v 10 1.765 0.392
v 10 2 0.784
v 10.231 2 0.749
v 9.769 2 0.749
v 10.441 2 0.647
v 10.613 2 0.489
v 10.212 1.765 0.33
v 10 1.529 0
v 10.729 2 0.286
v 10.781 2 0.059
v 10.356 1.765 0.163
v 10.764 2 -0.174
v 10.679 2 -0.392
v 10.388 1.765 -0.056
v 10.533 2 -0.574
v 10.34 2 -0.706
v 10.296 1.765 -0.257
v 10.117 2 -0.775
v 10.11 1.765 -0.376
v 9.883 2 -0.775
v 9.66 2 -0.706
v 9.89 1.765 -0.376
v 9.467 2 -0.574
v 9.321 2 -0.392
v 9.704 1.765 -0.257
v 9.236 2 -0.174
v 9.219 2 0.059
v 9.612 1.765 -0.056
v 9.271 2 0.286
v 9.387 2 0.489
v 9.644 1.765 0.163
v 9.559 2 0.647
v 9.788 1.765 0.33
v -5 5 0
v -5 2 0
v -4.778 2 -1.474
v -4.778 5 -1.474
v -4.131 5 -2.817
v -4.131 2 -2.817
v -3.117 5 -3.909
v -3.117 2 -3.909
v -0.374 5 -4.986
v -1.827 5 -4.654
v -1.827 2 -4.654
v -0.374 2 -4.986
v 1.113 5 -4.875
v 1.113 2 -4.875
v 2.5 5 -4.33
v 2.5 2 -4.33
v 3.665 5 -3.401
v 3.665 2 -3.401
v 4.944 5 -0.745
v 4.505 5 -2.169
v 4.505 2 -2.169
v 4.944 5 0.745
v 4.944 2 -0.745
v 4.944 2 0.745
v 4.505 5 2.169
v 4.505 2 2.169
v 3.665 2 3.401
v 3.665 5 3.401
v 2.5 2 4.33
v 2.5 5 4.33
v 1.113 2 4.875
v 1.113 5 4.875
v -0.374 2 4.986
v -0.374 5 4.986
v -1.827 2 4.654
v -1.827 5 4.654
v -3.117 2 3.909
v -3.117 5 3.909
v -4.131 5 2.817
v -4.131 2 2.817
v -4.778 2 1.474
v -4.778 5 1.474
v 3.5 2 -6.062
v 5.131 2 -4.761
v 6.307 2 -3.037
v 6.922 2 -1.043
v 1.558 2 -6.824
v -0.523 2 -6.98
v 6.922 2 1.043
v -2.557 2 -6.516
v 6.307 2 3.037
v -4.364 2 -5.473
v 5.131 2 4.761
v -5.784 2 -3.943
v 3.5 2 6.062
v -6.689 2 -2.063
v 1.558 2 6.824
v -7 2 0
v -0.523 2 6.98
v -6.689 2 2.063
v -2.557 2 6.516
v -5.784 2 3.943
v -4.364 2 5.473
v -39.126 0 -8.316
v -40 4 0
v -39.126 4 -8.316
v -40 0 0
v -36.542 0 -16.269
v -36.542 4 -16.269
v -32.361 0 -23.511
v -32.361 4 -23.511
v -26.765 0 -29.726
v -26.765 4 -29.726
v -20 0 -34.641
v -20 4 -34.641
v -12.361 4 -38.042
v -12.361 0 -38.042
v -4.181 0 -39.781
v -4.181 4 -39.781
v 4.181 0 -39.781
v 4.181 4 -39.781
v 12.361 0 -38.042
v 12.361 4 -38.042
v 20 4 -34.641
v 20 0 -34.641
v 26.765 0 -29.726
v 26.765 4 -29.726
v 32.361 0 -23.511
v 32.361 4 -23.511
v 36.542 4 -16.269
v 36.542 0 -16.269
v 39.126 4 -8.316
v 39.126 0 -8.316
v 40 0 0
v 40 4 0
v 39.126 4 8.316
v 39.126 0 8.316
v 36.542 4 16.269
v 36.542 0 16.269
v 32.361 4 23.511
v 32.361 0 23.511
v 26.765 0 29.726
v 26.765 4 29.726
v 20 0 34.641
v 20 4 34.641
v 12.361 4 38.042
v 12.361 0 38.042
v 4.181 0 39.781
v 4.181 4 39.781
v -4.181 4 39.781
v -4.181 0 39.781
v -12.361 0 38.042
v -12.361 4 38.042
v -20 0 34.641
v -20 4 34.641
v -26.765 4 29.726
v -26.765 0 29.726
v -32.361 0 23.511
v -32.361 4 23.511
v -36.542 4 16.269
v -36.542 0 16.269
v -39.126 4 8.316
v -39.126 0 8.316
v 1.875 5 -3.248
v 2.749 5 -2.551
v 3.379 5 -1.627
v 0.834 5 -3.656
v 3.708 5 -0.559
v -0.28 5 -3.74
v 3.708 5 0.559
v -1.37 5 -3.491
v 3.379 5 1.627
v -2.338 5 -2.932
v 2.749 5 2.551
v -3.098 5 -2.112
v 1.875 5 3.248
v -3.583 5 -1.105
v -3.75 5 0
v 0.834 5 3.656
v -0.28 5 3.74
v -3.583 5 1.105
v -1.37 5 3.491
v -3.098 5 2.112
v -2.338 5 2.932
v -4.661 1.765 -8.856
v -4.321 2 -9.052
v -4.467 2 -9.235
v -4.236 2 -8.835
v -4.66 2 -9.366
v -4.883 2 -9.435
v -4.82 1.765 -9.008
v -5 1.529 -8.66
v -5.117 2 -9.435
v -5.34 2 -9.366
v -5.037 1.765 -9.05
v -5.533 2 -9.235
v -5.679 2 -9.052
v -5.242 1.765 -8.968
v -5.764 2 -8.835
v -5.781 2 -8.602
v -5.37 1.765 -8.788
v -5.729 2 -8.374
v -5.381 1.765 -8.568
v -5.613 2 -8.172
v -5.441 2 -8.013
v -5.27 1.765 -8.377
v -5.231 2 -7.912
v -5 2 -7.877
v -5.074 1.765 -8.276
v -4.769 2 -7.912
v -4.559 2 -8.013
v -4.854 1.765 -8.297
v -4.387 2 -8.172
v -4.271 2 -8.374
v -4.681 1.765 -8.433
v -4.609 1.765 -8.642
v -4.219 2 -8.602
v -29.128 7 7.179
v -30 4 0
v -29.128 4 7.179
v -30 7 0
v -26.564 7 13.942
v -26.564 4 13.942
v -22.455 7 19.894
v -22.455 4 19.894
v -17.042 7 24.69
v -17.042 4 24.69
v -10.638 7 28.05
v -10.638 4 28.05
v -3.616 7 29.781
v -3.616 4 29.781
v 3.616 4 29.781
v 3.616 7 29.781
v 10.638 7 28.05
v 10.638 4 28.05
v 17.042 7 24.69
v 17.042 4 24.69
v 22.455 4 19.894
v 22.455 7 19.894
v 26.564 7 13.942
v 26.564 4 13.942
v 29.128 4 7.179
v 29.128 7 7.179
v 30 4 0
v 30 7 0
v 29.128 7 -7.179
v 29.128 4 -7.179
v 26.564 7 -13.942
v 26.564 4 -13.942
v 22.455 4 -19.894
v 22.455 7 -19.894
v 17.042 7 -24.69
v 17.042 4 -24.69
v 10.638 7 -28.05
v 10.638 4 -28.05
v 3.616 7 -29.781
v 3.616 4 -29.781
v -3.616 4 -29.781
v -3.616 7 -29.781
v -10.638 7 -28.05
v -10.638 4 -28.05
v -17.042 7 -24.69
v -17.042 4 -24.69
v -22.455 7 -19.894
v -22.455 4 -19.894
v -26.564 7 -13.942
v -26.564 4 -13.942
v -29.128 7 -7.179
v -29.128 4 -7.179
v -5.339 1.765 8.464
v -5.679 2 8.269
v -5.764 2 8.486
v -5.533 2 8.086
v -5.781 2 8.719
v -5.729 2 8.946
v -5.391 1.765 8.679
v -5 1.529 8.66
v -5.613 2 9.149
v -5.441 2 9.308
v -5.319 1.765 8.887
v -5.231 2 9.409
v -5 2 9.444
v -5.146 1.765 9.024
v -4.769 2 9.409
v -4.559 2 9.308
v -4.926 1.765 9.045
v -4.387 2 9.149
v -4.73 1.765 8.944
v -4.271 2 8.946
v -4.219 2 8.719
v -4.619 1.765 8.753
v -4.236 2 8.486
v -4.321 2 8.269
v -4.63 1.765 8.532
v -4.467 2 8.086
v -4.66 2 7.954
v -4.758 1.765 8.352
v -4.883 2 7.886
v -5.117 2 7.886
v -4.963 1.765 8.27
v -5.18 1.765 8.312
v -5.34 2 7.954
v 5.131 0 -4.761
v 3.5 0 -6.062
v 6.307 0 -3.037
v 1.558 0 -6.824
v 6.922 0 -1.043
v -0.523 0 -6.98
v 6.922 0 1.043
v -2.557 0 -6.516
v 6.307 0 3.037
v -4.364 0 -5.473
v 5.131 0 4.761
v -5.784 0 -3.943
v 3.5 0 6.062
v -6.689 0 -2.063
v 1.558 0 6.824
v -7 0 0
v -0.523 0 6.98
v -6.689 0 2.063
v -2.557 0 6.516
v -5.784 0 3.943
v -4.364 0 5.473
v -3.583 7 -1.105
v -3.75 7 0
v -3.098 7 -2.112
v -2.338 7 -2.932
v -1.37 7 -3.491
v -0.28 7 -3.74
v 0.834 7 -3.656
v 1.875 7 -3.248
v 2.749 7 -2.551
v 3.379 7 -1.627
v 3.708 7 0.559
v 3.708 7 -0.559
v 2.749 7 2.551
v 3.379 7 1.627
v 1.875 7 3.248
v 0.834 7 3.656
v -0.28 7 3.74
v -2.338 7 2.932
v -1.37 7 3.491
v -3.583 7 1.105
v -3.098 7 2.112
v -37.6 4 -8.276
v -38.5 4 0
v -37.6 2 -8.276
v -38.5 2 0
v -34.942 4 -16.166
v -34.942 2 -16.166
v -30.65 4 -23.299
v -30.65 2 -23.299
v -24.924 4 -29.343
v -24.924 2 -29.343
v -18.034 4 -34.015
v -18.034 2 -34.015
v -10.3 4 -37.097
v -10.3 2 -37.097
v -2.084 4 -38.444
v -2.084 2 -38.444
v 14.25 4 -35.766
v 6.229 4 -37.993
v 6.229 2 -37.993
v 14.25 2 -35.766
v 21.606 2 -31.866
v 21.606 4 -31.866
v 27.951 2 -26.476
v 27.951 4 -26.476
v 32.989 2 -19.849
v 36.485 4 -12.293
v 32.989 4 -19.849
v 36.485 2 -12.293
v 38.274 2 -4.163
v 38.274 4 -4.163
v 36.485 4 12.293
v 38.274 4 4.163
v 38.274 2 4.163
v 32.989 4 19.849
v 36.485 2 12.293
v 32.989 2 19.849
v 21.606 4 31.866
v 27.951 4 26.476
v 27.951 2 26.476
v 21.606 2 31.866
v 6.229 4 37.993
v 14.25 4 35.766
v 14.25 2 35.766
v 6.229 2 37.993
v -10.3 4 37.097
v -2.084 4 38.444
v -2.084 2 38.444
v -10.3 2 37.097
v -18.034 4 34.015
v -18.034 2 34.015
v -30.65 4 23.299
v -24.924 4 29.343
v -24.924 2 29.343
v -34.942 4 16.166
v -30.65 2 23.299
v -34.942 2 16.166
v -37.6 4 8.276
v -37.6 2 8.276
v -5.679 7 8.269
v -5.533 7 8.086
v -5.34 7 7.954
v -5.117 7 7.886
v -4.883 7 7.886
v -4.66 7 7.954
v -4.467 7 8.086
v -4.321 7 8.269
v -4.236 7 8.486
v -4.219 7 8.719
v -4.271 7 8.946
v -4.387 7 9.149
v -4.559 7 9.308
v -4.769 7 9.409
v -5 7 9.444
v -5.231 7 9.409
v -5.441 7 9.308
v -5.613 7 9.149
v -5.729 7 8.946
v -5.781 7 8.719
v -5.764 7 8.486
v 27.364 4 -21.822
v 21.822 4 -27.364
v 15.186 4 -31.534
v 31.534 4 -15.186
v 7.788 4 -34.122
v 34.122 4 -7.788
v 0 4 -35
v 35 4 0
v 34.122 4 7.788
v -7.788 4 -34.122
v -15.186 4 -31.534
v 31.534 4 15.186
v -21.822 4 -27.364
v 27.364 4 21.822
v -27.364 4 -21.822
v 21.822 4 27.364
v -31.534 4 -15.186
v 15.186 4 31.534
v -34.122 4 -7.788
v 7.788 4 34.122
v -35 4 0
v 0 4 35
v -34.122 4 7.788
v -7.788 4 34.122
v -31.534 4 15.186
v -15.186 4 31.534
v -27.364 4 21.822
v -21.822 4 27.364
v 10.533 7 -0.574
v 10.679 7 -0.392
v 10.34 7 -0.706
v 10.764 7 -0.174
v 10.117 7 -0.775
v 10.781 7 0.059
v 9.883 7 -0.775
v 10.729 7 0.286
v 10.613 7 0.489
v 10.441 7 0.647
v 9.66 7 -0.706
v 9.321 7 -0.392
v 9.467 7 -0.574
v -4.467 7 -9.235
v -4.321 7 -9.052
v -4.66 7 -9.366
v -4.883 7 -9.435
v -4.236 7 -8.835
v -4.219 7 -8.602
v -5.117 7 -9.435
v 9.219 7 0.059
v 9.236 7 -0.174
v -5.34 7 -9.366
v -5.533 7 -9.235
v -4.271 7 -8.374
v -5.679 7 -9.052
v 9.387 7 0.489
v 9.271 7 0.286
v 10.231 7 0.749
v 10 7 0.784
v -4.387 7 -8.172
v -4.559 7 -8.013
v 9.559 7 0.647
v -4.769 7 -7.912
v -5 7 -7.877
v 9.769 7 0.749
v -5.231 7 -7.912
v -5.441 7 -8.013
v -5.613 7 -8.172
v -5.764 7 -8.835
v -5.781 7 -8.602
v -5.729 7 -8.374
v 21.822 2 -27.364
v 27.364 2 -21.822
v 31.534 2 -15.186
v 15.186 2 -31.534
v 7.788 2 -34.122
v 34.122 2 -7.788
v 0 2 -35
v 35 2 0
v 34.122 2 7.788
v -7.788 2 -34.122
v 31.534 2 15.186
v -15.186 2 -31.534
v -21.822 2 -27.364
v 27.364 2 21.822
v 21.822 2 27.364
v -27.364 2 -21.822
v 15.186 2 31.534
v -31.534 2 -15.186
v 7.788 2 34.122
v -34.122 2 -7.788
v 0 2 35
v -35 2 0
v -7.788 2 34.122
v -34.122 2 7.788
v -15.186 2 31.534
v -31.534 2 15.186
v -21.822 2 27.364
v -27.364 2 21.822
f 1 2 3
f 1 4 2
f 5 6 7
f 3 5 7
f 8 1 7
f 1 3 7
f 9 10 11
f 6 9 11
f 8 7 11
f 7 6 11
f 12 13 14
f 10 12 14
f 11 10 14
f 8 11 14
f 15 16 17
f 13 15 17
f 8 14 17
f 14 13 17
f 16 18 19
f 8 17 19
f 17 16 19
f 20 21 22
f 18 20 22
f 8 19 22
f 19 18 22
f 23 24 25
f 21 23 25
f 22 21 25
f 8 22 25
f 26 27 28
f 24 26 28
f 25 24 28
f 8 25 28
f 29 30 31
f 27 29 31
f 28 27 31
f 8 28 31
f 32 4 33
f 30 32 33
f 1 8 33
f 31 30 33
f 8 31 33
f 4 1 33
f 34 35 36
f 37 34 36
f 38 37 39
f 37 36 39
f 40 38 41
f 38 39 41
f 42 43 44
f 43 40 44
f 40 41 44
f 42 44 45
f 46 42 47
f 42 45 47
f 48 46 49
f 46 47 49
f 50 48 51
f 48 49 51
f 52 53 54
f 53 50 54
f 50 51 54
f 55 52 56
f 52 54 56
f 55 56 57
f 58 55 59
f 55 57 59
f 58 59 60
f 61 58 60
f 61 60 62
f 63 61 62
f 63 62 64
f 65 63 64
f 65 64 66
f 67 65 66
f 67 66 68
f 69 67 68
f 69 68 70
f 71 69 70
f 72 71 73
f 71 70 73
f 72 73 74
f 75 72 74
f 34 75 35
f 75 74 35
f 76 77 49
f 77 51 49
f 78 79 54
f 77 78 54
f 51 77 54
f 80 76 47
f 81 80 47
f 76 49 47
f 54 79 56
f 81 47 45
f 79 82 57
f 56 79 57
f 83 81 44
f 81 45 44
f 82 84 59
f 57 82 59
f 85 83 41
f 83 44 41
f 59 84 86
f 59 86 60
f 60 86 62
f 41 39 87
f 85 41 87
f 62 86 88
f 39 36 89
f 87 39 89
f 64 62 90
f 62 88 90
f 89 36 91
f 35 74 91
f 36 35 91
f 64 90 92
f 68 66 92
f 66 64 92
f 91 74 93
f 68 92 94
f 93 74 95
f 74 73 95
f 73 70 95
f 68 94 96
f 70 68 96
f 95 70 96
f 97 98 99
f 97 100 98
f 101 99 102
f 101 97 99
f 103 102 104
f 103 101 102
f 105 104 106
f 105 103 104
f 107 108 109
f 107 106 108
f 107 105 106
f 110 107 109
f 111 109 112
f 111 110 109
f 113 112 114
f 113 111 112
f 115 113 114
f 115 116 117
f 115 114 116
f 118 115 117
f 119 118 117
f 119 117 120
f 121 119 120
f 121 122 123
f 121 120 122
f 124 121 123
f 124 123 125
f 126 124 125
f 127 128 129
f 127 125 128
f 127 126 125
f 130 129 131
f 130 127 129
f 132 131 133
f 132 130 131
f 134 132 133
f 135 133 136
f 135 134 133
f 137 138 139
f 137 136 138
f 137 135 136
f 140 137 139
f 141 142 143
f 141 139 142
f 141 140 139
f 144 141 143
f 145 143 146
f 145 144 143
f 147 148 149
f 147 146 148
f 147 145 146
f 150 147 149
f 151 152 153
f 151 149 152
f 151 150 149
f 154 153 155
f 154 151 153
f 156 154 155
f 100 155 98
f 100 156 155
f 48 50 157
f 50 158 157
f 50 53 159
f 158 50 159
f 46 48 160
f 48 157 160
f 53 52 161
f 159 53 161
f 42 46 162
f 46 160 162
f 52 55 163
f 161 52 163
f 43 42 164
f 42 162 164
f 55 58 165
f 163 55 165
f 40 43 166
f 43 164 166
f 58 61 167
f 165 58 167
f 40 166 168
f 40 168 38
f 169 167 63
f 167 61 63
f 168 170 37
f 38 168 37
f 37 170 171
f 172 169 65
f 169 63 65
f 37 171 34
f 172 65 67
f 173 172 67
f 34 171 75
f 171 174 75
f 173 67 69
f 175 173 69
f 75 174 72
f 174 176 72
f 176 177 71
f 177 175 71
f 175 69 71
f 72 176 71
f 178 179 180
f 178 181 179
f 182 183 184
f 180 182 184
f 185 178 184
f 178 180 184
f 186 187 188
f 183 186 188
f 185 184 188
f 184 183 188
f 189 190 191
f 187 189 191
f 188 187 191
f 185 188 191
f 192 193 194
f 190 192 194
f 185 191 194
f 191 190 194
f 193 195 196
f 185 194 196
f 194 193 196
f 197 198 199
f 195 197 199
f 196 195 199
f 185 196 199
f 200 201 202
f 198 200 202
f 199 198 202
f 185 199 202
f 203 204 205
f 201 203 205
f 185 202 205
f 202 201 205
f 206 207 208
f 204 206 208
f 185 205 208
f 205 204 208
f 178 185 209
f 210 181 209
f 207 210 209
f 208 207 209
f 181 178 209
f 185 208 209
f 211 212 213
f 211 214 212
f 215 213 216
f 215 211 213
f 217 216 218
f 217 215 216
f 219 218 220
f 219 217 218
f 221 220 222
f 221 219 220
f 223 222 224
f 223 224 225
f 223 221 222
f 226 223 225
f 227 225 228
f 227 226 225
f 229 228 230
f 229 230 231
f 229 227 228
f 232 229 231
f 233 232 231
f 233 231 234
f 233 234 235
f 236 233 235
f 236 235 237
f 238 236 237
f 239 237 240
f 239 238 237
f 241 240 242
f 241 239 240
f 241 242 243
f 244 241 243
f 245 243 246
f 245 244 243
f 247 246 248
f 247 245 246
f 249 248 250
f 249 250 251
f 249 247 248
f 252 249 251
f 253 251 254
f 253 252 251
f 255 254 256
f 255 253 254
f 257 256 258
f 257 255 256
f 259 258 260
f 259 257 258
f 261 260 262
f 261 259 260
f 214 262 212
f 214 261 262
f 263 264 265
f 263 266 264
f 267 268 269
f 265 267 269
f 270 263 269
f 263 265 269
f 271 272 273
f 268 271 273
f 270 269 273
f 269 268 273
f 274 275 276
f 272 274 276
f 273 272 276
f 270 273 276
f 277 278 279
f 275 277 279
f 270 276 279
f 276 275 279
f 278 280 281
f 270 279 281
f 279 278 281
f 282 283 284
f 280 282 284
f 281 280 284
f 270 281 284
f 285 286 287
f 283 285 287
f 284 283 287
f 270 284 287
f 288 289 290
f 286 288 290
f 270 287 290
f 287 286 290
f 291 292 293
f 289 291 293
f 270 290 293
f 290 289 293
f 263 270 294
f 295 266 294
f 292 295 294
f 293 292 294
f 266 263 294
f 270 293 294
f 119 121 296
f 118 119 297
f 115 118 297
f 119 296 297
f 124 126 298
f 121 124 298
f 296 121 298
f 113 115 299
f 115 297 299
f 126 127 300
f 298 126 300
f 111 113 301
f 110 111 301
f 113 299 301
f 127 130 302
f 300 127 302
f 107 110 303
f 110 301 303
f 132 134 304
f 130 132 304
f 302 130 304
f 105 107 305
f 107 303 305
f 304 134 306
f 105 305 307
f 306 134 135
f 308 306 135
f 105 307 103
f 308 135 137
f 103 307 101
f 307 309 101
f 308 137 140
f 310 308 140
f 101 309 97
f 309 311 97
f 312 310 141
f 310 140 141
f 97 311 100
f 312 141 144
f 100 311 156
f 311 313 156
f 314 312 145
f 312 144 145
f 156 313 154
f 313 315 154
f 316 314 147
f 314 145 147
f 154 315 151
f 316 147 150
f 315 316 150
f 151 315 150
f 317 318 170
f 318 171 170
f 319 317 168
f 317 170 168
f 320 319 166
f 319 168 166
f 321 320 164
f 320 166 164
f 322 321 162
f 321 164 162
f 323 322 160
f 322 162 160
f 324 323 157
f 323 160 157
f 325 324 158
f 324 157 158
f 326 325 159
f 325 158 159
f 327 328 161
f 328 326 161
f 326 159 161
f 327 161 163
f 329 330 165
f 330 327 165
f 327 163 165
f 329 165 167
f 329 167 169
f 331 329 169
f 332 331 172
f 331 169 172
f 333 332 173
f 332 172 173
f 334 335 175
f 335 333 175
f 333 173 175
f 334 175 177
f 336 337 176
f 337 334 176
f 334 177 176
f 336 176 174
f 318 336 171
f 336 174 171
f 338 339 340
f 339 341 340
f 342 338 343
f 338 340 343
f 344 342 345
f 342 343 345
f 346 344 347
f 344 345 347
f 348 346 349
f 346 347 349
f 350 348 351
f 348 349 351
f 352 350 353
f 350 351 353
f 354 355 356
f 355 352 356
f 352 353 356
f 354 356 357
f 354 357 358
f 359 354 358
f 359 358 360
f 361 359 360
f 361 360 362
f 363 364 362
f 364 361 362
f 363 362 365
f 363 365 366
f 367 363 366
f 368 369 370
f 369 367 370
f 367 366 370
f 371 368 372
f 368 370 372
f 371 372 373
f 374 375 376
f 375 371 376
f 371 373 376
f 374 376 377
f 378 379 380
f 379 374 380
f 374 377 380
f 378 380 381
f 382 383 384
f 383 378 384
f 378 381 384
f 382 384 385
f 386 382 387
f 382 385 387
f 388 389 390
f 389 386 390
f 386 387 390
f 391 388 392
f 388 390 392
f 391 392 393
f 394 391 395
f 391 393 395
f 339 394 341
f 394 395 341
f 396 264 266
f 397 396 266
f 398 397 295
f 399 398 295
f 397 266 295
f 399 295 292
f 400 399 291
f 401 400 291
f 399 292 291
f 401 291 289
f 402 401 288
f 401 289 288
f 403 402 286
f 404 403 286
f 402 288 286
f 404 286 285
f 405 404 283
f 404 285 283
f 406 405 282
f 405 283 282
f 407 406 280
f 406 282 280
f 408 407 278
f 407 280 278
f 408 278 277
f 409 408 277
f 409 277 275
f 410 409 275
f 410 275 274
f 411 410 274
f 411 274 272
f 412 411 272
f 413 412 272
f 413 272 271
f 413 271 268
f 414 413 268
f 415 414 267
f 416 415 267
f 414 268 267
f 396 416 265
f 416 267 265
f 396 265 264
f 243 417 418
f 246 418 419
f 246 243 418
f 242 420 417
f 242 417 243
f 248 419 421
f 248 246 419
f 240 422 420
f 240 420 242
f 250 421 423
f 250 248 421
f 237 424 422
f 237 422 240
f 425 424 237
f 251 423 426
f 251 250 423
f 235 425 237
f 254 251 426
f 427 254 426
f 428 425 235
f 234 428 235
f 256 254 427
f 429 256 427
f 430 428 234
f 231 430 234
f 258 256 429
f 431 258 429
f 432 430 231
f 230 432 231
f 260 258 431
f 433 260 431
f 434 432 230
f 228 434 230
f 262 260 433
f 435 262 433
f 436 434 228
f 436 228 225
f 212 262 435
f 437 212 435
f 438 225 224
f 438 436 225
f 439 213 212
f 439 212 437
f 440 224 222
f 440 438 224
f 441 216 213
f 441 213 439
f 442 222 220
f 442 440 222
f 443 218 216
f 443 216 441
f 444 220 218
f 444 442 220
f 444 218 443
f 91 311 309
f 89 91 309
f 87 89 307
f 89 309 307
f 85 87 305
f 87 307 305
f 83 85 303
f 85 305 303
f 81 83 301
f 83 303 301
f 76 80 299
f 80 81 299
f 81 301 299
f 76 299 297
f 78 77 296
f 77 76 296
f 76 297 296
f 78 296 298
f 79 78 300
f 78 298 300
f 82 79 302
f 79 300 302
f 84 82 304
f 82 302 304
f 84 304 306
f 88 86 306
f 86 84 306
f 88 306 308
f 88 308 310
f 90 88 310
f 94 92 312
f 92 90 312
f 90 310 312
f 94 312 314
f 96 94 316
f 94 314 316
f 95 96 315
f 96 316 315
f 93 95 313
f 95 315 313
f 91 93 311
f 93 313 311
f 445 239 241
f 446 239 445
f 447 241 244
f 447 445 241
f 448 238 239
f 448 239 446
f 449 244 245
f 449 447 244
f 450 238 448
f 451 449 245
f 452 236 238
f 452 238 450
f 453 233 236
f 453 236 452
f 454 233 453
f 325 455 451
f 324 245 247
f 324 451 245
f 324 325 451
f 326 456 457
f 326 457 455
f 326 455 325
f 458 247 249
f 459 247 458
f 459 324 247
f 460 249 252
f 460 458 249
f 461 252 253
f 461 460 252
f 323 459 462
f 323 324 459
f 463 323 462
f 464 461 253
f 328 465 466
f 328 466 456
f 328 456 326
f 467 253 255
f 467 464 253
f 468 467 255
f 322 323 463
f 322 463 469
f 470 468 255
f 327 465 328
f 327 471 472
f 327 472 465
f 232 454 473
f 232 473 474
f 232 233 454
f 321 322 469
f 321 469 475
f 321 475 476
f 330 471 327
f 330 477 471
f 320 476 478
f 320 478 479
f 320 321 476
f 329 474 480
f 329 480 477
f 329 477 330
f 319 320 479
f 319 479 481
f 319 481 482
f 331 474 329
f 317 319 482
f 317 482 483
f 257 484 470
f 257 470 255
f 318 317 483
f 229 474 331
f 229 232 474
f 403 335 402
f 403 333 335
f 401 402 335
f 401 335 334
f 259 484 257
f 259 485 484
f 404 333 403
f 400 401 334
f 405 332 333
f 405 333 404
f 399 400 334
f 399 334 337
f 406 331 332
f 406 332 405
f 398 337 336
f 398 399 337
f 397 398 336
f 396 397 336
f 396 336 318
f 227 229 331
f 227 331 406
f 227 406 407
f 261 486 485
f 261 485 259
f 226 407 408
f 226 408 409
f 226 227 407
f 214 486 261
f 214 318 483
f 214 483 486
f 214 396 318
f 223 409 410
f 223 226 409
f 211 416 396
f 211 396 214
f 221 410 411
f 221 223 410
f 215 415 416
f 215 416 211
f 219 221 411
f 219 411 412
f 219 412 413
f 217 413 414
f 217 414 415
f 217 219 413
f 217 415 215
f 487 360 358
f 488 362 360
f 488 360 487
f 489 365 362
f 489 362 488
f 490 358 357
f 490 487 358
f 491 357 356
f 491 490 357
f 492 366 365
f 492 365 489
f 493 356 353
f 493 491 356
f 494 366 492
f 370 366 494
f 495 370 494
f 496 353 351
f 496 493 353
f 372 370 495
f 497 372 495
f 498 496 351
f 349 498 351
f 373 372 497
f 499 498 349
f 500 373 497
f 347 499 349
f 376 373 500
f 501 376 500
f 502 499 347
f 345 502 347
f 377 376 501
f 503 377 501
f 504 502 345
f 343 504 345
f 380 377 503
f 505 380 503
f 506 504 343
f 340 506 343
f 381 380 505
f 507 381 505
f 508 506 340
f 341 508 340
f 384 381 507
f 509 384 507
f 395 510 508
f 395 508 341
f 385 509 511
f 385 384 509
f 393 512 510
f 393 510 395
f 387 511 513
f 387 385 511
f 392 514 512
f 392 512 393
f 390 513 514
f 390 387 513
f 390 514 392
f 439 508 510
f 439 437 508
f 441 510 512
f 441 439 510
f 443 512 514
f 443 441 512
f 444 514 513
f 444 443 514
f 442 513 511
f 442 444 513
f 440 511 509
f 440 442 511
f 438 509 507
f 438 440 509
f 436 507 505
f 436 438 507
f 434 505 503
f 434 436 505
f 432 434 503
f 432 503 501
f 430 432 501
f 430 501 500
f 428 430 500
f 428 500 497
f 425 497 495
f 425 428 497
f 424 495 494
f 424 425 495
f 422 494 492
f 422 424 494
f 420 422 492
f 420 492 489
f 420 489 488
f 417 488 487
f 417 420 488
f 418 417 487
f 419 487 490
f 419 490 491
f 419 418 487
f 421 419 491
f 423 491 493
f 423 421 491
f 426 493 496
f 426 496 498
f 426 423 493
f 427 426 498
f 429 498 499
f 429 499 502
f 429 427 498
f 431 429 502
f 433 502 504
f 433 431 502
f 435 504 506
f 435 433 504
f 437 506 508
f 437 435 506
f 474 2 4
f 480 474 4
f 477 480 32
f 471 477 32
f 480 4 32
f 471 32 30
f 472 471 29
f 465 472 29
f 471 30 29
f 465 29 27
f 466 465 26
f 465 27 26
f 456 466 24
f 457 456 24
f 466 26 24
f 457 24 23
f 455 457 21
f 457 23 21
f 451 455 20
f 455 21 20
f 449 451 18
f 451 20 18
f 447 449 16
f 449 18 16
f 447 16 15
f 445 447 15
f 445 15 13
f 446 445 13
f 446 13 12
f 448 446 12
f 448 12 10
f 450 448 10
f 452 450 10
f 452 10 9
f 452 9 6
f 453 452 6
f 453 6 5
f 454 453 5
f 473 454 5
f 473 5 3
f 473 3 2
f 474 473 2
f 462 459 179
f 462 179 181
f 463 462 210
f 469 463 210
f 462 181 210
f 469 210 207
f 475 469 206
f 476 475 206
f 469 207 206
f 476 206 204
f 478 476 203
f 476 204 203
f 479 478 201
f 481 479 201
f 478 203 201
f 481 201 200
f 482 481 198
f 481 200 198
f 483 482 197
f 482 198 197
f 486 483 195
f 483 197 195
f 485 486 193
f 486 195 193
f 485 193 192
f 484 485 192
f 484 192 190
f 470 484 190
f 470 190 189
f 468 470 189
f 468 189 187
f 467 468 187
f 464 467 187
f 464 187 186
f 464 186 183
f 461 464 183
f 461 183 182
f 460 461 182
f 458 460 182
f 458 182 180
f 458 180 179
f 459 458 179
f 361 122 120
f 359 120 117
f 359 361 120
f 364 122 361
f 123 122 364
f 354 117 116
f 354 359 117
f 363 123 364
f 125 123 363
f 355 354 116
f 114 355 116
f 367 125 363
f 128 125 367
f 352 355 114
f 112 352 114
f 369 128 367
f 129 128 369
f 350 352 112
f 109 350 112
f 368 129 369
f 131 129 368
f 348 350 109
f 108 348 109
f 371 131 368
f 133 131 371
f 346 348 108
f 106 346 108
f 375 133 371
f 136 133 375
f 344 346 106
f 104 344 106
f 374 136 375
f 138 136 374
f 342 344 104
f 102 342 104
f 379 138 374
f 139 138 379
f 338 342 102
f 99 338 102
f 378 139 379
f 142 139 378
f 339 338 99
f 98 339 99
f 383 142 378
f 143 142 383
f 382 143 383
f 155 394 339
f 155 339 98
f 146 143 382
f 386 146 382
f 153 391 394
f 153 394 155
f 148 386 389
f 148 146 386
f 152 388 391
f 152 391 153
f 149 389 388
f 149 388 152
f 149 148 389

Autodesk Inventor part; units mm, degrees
ref_plane "YZ Plane" through (0, 0, 0) normal (1, 0, 0) x (0, 1, 0)
ref_plane "XZ Plane" through (0, 0, 0) normal (0, 1, 0) x (-1, 0, 0)
ref_plane "XY Plane" through (0, 0, 0) normal (0, 0, 1) x (1, 0, 0)
sketch "Sketch1" plane through (0, 0, 0) normal (0, 0, 1) x (1, 0, 0)
  line L0 (0, 0) -> (0, 5) construction
  line L1 (-40, 4) -> (-40, 0)
  line L2 (-40, 0) -> (-4.5, 0)
  line L3 (-38.5, 4) -> (-38.5, 2)
  line L4 (-38.5, 2) -> (-35, 2)
  line L5 (-35, 2) -> (-35, 4)
  line L6 (-30, 4) -> (-35, 4)
  line L7 (-38.5, 4) -> (-40, 4)
  line L8 (-3.75, 5) -> (-5, 5)
  line L9 (-5, 5) -> (-5, 2)
  line L10 (-3.5, 2.9949) -> (3.5, 2.9949)
  line L11 (3.5, 2.9949) -> (3.5, 2.0051)
  line L12 (3.5, 2.0051) -> (-3.5, 2.0051)
  line L13 (-3.5, 2.0051) -> (-3.5, 2.9949)
  line L14 (-3.5, 2.9949) -> (3.5, 2.0051) construction
  line L15 (3.5, 2.9949) -> (-3.5, 2.0051) construction
  line L16 (-30, 4) -> (-30, 7)
  line L17 (-30, 7) -> (-3.75, 7)
  line L18 (-3.75, 7) -> (-3.75, 5)
  line L19 (-5, 2) -> (-7, 2)
  line L20 (-7, 2) -> (-7, 0)
  point P0 (0, 2.5)
  dimension "d0" = 4
  dimension "d3" = 80
  dimension "d6" = 3.5
  dimension "d7" = 2
  dimension "d15" = 70
  dimension "d16" = 7
  dimension "d17" = 1.5
  dimension "d18" = 3
  dimension "d33" = 3
  dimension "d34" = 60
  dimension "d35" = 7.5
  dimension "d40" = 14
  dimension "d41" = 2
revolve "Revolution1" add sketch "Sketch1" angle 360 about axis through (0, 0, 0) along (0, 1, 0) contours L7 L3 L4 L5 L6 L16 L17 L18 L8 L9 L19 L20 L2 L1
sketch "Sketch3" plane through (0, 7, 0) normal (0, 1, 0) x (1, 0, 0)
  circle A0 centre (0, 0) radius 3.75 projected
  point P0 (10, 0)
  dimension "d36" = 10
hole "Hole1" at (10, 7, 0) direction (0, -1, 0) diameter 1.567 depth 5 tip angle 118 thread size "M2x0.4" class "6H" standard "ISO Metric profile"
pattern_circular "Circular Pattern2" count 3 over 360 about axis through (0, 5.5, 0) along (0, 1, 0) of "Hole1"
properties part number "007" material "Stainless Steel, 440C"
